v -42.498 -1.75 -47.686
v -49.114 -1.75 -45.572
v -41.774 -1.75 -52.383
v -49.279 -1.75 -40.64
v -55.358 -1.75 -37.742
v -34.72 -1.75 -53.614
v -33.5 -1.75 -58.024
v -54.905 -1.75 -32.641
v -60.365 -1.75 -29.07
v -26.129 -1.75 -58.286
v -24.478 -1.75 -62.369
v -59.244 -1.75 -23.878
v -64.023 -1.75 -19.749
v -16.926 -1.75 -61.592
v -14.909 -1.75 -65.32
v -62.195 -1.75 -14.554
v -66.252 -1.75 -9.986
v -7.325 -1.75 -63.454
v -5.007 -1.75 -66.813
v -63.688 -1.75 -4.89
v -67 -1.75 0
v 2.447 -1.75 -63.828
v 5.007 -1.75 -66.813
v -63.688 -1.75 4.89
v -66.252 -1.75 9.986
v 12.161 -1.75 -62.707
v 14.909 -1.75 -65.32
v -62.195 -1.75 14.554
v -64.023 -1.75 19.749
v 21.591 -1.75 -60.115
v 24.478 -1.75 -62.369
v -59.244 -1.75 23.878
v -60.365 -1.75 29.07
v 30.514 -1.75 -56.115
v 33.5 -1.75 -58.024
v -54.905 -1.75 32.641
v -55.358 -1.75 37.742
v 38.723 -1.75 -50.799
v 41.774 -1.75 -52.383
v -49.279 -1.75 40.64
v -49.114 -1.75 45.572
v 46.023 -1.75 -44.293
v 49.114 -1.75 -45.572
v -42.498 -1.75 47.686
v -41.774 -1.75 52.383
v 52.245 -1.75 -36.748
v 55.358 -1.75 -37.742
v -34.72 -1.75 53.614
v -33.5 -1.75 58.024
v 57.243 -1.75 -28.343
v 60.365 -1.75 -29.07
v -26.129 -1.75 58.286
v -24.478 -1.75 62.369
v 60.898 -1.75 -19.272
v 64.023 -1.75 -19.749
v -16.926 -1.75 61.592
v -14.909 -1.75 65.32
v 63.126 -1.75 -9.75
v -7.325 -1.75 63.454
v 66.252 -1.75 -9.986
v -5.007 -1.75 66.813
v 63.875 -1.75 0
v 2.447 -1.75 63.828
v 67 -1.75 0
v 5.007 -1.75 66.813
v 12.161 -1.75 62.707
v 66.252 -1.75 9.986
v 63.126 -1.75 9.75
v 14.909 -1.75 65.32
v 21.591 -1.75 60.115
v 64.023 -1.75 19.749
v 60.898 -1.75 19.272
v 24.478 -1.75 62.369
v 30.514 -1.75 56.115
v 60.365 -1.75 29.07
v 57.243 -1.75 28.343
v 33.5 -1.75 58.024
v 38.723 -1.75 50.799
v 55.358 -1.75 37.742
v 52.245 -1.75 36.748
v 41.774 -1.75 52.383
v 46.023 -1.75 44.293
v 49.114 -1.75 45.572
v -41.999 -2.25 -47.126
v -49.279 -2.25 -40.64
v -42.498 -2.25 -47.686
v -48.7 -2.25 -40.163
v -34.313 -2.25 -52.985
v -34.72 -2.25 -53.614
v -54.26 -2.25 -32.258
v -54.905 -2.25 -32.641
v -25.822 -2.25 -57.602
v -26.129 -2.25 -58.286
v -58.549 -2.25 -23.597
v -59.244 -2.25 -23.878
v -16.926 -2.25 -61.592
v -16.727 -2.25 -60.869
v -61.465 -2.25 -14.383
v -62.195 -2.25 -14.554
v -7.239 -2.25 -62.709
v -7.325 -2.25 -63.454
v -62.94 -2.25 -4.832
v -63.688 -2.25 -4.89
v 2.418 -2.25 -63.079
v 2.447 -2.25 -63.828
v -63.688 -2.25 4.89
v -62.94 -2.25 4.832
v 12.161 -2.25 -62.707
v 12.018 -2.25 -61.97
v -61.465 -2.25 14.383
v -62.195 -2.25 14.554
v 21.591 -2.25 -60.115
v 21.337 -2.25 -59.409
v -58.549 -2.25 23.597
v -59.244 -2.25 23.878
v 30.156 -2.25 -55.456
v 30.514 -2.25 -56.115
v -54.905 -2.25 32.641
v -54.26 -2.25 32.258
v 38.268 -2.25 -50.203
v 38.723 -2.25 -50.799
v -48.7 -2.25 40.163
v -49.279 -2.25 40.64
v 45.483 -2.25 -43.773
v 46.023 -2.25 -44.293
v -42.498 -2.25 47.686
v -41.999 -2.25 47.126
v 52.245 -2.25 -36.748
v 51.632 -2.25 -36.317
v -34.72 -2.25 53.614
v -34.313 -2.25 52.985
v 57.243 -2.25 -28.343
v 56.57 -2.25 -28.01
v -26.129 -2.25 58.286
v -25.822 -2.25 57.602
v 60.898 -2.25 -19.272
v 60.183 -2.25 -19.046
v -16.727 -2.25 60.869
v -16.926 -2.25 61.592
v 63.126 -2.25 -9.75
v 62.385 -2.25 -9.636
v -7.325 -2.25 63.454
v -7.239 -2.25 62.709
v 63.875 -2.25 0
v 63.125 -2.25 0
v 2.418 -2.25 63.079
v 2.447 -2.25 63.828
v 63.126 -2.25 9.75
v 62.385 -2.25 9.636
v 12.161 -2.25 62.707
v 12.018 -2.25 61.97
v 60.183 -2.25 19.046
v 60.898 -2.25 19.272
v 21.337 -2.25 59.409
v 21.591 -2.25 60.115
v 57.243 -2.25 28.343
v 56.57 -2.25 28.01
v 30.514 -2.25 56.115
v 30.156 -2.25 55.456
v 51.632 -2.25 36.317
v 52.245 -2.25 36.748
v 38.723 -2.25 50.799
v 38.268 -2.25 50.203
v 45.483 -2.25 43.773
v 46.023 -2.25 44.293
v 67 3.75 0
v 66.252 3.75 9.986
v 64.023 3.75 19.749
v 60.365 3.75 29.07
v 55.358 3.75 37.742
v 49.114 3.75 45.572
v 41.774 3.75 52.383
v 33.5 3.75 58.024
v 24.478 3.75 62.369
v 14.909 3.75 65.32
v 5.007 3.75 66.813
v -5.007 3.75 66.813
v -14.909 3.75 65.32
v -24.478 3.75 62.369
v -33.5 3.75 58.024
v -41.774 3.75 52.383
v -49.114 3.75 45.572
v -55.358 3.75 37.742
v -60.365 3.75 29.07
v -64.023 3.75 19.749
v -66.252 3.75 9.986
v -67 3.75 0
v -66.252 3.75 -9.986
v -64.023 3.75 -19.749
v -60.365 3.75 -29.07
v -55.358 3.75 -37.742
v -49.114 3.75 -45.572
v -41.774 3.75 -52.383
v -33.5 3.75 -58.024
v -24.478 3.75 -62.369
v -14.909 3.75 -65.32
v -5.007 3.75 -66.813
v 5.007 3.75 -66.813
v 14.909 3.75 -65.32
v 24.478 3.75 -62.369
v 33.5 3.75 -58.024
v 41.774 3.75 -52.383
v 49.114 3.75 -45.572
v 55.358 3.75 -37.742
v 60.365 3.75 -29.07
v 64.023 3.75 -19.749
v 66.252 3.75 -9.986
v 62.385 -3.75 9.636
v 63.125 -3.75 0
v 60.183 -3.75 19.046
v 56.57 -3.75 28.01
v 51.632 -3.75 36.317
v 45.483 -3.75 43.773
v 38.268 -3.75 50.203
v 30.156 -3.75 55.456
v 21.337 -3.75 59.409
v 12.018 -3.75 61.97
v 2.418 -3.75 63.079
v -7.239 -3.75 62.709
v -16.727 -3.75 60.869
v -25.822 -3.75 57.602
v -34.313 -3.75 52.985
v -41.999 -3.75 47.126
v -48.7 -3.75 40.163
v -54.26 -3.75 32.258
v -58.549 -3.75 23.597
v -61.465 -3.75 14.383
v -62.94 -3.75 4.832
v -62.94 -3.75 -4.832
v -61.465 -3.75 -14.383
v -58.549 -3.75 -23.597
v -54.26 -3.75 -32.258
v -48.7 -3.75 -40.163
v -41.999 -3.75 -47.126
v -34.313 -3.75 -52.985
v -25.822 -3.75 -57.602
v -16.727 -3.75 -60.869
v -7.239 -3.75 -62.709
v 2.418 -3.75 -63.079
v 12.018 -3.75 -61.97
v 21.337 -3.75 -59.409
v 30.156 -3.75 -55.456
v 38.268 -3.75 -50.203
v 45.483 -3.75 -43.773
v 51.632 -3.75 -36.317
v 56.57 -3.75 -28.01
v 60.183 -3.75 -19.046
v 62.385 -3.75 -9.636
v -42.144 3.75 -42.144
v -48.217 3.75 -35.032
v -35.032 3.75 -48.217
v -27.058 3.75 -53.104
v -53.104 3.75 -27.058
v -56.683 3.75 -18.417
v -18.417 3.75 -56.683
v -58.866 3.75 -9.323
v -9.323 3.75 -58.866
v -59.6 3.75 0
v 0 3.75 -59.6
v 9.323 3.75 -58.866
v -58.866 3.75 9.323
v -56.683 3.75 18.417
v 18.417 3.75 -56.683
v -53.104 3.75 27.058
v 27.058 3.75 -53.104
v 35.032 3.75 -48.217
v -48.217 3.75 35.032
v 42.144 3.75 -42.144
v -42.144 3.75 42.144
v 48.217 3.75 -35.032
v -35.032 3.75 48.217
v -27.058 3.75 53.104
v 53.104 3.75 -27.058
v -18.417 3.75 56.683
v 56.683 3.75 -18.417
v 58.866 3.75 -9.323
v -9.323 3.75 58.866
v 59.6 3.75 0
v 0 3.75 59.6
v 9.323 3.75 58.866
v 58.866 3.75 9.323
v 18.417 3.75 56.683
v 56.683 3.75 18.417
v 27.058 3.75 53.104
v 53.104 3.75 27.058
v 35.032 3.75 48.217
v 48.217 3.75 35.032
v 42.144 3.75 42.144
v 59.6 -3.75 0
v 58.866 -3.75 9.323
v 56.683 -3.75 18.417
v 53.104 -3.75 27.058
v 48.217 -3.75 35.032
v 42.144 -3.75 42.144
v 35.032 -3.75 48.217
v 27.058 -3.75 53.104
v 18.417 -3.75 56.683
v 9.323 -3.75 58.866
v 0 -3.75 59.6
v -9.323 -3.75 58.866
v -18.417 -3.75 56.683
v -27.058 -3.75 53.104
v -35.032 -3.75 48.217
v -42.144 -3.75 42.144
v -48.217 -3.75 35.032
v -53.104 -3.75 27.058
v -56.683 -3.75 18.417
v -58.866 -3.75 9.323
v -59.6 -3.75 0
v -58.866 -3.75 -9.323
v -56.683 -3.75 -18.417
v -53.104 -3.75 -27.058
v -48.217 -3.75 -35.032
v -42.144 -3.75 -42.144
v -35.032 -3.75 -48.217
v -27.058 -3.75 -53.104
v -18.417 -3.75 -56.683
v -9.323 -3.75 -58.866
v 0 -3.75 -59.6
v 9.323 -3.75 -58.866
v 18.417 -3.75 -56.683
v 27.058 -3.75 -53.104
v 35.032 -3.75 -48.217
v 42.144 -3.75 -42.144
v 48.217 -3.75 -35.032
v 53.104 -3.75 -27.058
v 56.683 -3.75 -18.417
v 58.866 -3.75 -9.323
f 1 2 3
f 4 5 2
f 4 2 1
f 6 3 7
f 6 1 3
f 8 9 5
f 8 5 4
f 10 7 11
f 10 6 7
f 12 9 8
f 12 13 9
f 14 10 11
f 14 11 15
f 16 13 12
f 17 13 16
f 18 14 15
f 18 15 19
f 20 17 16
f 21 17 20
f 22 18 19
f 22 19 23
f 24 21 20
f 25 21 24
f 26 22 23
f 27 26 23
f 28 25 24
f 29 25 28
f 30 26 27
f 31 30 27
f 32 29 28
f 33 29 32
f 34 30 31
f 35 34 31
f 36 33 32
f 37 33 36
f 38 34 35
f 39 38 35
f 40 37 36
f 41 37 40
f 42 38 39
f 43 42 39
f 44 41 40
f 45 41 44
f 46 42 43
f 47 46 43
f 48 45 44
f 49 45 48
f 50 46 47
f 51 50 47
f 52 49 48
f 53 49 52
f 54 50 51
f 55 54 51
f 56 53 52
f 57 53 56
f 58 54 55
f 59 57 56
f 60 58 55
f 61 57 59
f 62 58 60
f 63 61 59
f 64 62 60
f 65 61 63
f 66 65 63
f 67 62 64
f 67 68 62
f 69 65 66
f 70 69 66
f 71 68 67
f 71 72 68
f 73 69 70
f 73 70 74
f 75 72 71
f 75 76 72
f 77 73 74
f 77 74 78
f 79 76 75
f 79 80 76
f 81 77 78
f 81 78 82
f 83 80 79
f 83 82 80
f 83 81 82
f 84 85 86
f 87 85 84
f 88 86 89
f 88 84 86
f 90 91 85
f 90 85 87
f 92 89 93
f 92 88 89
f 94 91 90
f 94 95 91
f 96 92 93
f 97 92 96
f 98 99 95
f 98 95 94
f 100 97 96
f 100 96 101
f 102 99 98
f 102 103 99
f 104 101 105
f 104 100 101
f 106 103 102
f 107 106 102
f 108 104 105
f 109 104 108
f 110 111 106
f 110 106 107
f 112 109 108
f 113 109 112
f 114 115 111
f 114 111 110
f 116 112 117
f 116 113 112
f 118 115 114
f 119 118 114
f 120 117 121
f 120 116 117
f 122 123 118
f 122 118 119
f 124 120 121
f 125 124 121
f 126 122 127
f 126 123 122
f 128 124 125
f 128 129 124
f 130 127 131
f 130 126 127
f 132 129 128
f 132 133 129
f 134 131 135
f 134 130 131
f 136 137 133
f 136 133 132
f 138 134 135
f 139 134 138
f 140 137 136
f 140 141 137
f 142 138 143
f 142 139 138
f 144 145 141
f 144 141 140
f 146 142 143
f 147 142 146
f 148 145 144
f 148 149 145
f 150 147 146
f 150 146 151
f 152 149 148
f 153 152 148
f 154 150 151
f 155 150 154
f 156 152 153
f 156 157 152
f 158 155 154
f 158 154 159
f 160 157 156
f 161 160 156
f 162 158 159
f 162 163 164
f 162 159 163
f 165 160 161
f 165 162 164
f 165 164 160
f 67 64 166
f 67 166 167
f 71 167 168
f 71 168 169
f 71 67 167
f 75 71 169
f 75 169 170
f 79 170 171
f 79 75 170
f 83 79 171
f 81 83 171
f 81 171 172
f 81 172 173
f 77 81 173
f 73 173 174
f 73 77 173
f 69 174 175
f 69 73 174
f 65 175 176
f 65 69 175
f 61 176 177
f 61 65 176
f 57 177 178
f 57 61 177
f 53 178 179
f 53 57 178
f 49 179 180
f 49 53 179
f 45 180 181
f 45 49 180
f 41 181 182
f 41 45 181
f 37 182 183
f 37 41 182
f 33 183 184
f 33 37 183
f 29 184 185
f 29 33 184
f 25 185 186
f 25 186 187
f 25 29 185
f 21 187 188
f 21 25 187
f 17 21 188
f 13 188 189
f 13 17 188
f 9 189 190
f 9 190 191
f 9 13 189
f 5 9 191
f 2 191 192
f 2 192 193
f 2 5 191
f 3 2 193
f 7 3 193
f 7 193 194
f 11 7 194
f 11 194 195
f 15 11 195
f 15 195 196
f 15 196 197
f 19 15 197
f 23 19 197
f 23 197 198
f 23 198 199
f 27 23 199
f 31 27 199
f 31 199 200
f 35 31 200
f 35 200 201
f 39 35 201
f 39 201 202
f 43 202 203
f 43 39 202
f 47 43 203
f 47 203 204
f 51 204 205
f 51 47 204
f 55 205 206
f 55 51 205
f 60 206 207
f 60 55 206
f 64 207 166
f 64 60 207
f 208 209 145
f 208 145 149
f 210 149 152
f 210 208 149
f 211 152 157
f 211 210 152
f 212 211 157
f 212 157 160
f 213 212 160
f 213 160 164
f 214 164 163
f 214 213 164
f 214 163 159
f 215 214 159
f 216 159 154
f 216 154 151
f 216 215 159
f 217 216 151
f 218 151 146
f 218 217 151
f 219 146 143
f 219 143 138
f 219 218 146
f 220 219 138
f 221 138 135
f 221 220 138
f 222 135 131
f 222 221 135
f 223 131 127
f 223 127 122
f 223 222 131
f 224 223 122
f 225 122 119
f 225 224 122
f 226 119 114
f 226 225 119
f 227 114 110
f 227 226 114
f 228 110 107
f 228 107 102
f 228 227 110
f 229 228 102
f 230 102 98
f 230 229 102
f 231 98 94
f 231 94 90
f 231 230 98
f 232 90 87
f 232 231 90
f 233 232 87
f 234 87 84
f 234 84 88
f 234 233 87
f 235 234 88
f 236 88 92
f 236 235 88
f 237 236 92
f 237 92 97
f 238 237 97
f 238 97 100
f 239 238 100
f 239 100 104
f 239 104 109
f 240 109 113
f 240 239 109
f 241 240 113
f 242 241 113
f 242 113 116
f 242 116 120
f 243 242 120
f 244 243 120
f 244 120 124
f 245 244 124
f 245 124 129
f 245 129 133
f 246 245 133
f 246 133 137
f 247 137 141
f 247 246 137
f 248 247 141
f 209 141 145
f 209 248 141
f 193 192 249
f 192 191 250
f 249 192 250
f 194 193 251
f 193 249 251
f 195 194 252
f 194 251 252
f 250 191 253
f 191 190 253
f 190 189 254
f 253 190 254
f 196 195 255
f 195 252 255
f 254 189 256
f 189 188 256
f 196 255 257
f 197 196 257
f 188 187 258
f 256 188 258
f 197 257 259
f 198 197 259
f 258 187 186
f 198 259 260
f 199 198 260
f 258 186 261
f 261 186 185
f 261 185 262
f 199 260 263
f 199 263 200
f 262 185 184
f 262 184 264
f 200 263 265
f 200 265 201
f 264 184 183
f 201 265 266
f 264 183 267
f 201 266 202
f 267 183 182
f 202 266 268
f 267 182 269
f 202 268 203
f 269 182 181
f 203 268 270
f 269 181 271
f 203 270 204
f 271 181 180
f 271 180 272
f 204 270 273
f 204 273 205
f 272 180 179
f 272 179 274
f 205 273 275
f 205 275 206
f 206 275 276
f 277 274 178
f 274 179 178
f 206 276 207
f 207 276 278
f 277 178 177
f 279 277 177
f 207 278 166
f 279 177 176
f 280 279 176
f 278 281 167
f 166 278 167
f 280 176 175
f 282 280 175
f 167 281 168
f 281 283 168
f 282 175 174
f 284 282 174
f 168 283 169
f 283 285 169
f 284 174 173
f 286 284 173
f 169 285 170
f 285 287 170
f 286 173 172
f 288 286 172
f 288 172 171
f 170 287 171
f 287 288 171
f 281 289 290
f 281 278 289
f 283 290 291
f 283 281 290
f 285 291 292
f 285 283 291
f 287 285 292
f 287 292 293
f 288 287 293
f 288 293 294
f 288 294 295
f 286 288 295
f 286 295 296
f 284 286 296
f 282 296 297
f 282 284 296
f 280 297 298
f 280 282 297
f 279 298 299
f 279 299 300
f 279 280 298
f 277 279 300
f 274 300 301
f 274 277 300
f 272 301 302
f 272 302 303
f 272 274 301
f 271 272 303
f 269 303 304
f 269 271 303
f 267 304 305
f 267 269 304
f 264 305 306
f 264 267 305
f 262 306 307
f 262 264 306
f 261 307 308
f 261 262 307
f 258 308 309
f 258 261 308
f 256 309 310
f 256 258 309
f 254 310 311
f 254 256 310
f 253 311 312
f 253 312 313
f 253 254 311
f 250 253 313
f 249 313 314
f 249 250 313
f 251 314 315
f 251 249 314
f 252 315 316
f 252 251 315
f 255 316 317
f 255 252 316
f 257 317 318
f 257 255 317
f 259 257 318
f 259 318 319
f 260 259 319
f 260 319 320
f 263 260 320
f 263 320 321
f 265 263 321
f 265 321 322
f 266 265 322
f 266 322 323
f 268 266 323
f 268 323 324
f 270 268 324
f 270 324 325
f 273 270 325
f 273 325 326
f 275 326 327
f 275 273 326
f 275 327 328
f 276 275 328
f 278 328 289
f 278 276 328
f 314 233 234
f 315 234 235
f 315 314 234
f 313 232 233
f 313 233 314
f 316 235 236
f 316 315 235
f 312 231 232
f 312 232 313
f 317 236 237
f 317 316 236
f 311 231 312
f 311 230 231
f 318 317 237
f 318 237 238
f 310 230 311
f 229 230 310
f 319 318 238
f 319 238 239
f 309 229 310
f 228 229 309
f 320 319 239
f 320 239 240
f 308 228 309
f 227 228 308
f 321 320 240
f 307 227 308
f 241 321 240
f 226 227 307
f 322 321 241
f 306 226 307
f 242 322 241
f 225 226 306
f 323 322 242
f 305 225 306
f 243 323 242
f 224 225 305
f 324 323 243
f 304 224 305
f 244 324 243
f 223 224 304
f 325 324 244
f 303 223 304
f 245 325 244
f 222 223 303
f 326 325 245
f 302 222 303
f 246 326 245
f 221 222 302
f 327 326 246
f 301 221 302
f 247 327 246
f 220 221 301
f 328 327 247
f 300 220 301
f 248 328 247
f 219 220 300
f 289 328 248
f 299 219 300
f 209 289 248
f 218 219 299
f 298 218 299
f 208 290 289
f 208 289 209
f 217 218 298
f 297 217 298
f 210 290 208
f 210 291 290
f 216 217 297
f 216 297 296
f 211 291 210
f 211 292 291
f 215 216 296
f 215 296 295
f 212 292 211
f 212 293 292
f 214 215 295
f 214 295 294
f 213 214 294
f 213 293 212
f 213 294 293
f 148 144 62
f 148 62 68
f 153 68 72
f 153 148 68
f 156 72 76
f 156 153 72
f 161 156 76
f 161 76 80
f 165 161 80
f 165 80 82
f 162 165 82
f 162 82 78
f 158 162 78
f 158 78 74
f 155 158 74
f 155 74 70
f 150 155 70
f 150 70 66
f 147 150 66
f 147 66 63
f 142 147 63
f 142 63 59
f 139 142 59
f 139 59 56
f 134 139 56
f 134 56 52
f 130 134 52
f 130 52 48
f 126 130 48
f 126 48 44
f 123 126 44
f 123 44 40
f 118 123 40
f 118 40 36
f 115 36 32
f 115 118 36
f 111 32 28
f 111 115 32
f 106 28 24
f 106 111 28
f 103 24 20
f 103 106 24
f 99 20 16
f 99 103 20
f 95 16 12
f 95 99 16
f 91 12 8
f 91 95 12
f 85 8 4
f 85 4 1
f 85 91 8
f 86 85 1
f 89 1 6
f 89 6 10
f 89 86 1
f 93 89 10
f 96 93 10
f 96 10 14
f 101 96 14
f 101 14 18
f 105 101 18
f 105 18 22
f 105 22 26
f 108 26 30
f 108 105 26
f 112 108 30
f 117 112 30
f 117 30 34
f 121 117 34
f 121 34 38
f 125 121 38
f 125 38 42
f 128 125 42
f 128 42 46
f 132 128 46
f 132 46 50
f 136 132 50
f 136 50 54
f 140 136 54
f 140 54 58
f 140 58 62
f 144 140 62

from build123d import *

# Parameters (mm, degrees)
F0_R        = 67
F0_R_2      = 59.6
F1_DEPTH    = 3.75
F2_R        = 63.875
F2_R_2      = 63.125
F3_DEPTH    = 1.5
F3_FACE_R   = 67
F3_FACE_R_2 = 63.875
F4_DEPTH    = 2


with BuildPart() as f1:
    # F0 (on Front) → F1 (new body, symmetric)
    with BuildSketch(Plane.XZ):
        Circle(F0_R)
        Circle(F0_R_2, mode=Mode.SUBTRACT)
    extrude(amount=F1_DEPTH, both=True)

    # F2 (on face) → F3 (cut)
    with BuildSketch(Plane.XZ.offset(3.75)):
        Circle(F2_R)
        Circle(F2_R_2, mode=Mode.SUBTRACT)
    extrude(amount=-F3_DEPTH, mode=Mode.SUBTRACT)

    # F3_face (on face) → F4 (cut)
    with BuildSketch(Plane.XZ.offset(3.75)):
        Circle(F3_FACE_R)
        Circle(F3_FACE_R_2, mode=Mode.SUBTRACT)
    extrude(amount=-F4_DEPTH, mode=Mode.SUBTRACT)


solid = f1.part
